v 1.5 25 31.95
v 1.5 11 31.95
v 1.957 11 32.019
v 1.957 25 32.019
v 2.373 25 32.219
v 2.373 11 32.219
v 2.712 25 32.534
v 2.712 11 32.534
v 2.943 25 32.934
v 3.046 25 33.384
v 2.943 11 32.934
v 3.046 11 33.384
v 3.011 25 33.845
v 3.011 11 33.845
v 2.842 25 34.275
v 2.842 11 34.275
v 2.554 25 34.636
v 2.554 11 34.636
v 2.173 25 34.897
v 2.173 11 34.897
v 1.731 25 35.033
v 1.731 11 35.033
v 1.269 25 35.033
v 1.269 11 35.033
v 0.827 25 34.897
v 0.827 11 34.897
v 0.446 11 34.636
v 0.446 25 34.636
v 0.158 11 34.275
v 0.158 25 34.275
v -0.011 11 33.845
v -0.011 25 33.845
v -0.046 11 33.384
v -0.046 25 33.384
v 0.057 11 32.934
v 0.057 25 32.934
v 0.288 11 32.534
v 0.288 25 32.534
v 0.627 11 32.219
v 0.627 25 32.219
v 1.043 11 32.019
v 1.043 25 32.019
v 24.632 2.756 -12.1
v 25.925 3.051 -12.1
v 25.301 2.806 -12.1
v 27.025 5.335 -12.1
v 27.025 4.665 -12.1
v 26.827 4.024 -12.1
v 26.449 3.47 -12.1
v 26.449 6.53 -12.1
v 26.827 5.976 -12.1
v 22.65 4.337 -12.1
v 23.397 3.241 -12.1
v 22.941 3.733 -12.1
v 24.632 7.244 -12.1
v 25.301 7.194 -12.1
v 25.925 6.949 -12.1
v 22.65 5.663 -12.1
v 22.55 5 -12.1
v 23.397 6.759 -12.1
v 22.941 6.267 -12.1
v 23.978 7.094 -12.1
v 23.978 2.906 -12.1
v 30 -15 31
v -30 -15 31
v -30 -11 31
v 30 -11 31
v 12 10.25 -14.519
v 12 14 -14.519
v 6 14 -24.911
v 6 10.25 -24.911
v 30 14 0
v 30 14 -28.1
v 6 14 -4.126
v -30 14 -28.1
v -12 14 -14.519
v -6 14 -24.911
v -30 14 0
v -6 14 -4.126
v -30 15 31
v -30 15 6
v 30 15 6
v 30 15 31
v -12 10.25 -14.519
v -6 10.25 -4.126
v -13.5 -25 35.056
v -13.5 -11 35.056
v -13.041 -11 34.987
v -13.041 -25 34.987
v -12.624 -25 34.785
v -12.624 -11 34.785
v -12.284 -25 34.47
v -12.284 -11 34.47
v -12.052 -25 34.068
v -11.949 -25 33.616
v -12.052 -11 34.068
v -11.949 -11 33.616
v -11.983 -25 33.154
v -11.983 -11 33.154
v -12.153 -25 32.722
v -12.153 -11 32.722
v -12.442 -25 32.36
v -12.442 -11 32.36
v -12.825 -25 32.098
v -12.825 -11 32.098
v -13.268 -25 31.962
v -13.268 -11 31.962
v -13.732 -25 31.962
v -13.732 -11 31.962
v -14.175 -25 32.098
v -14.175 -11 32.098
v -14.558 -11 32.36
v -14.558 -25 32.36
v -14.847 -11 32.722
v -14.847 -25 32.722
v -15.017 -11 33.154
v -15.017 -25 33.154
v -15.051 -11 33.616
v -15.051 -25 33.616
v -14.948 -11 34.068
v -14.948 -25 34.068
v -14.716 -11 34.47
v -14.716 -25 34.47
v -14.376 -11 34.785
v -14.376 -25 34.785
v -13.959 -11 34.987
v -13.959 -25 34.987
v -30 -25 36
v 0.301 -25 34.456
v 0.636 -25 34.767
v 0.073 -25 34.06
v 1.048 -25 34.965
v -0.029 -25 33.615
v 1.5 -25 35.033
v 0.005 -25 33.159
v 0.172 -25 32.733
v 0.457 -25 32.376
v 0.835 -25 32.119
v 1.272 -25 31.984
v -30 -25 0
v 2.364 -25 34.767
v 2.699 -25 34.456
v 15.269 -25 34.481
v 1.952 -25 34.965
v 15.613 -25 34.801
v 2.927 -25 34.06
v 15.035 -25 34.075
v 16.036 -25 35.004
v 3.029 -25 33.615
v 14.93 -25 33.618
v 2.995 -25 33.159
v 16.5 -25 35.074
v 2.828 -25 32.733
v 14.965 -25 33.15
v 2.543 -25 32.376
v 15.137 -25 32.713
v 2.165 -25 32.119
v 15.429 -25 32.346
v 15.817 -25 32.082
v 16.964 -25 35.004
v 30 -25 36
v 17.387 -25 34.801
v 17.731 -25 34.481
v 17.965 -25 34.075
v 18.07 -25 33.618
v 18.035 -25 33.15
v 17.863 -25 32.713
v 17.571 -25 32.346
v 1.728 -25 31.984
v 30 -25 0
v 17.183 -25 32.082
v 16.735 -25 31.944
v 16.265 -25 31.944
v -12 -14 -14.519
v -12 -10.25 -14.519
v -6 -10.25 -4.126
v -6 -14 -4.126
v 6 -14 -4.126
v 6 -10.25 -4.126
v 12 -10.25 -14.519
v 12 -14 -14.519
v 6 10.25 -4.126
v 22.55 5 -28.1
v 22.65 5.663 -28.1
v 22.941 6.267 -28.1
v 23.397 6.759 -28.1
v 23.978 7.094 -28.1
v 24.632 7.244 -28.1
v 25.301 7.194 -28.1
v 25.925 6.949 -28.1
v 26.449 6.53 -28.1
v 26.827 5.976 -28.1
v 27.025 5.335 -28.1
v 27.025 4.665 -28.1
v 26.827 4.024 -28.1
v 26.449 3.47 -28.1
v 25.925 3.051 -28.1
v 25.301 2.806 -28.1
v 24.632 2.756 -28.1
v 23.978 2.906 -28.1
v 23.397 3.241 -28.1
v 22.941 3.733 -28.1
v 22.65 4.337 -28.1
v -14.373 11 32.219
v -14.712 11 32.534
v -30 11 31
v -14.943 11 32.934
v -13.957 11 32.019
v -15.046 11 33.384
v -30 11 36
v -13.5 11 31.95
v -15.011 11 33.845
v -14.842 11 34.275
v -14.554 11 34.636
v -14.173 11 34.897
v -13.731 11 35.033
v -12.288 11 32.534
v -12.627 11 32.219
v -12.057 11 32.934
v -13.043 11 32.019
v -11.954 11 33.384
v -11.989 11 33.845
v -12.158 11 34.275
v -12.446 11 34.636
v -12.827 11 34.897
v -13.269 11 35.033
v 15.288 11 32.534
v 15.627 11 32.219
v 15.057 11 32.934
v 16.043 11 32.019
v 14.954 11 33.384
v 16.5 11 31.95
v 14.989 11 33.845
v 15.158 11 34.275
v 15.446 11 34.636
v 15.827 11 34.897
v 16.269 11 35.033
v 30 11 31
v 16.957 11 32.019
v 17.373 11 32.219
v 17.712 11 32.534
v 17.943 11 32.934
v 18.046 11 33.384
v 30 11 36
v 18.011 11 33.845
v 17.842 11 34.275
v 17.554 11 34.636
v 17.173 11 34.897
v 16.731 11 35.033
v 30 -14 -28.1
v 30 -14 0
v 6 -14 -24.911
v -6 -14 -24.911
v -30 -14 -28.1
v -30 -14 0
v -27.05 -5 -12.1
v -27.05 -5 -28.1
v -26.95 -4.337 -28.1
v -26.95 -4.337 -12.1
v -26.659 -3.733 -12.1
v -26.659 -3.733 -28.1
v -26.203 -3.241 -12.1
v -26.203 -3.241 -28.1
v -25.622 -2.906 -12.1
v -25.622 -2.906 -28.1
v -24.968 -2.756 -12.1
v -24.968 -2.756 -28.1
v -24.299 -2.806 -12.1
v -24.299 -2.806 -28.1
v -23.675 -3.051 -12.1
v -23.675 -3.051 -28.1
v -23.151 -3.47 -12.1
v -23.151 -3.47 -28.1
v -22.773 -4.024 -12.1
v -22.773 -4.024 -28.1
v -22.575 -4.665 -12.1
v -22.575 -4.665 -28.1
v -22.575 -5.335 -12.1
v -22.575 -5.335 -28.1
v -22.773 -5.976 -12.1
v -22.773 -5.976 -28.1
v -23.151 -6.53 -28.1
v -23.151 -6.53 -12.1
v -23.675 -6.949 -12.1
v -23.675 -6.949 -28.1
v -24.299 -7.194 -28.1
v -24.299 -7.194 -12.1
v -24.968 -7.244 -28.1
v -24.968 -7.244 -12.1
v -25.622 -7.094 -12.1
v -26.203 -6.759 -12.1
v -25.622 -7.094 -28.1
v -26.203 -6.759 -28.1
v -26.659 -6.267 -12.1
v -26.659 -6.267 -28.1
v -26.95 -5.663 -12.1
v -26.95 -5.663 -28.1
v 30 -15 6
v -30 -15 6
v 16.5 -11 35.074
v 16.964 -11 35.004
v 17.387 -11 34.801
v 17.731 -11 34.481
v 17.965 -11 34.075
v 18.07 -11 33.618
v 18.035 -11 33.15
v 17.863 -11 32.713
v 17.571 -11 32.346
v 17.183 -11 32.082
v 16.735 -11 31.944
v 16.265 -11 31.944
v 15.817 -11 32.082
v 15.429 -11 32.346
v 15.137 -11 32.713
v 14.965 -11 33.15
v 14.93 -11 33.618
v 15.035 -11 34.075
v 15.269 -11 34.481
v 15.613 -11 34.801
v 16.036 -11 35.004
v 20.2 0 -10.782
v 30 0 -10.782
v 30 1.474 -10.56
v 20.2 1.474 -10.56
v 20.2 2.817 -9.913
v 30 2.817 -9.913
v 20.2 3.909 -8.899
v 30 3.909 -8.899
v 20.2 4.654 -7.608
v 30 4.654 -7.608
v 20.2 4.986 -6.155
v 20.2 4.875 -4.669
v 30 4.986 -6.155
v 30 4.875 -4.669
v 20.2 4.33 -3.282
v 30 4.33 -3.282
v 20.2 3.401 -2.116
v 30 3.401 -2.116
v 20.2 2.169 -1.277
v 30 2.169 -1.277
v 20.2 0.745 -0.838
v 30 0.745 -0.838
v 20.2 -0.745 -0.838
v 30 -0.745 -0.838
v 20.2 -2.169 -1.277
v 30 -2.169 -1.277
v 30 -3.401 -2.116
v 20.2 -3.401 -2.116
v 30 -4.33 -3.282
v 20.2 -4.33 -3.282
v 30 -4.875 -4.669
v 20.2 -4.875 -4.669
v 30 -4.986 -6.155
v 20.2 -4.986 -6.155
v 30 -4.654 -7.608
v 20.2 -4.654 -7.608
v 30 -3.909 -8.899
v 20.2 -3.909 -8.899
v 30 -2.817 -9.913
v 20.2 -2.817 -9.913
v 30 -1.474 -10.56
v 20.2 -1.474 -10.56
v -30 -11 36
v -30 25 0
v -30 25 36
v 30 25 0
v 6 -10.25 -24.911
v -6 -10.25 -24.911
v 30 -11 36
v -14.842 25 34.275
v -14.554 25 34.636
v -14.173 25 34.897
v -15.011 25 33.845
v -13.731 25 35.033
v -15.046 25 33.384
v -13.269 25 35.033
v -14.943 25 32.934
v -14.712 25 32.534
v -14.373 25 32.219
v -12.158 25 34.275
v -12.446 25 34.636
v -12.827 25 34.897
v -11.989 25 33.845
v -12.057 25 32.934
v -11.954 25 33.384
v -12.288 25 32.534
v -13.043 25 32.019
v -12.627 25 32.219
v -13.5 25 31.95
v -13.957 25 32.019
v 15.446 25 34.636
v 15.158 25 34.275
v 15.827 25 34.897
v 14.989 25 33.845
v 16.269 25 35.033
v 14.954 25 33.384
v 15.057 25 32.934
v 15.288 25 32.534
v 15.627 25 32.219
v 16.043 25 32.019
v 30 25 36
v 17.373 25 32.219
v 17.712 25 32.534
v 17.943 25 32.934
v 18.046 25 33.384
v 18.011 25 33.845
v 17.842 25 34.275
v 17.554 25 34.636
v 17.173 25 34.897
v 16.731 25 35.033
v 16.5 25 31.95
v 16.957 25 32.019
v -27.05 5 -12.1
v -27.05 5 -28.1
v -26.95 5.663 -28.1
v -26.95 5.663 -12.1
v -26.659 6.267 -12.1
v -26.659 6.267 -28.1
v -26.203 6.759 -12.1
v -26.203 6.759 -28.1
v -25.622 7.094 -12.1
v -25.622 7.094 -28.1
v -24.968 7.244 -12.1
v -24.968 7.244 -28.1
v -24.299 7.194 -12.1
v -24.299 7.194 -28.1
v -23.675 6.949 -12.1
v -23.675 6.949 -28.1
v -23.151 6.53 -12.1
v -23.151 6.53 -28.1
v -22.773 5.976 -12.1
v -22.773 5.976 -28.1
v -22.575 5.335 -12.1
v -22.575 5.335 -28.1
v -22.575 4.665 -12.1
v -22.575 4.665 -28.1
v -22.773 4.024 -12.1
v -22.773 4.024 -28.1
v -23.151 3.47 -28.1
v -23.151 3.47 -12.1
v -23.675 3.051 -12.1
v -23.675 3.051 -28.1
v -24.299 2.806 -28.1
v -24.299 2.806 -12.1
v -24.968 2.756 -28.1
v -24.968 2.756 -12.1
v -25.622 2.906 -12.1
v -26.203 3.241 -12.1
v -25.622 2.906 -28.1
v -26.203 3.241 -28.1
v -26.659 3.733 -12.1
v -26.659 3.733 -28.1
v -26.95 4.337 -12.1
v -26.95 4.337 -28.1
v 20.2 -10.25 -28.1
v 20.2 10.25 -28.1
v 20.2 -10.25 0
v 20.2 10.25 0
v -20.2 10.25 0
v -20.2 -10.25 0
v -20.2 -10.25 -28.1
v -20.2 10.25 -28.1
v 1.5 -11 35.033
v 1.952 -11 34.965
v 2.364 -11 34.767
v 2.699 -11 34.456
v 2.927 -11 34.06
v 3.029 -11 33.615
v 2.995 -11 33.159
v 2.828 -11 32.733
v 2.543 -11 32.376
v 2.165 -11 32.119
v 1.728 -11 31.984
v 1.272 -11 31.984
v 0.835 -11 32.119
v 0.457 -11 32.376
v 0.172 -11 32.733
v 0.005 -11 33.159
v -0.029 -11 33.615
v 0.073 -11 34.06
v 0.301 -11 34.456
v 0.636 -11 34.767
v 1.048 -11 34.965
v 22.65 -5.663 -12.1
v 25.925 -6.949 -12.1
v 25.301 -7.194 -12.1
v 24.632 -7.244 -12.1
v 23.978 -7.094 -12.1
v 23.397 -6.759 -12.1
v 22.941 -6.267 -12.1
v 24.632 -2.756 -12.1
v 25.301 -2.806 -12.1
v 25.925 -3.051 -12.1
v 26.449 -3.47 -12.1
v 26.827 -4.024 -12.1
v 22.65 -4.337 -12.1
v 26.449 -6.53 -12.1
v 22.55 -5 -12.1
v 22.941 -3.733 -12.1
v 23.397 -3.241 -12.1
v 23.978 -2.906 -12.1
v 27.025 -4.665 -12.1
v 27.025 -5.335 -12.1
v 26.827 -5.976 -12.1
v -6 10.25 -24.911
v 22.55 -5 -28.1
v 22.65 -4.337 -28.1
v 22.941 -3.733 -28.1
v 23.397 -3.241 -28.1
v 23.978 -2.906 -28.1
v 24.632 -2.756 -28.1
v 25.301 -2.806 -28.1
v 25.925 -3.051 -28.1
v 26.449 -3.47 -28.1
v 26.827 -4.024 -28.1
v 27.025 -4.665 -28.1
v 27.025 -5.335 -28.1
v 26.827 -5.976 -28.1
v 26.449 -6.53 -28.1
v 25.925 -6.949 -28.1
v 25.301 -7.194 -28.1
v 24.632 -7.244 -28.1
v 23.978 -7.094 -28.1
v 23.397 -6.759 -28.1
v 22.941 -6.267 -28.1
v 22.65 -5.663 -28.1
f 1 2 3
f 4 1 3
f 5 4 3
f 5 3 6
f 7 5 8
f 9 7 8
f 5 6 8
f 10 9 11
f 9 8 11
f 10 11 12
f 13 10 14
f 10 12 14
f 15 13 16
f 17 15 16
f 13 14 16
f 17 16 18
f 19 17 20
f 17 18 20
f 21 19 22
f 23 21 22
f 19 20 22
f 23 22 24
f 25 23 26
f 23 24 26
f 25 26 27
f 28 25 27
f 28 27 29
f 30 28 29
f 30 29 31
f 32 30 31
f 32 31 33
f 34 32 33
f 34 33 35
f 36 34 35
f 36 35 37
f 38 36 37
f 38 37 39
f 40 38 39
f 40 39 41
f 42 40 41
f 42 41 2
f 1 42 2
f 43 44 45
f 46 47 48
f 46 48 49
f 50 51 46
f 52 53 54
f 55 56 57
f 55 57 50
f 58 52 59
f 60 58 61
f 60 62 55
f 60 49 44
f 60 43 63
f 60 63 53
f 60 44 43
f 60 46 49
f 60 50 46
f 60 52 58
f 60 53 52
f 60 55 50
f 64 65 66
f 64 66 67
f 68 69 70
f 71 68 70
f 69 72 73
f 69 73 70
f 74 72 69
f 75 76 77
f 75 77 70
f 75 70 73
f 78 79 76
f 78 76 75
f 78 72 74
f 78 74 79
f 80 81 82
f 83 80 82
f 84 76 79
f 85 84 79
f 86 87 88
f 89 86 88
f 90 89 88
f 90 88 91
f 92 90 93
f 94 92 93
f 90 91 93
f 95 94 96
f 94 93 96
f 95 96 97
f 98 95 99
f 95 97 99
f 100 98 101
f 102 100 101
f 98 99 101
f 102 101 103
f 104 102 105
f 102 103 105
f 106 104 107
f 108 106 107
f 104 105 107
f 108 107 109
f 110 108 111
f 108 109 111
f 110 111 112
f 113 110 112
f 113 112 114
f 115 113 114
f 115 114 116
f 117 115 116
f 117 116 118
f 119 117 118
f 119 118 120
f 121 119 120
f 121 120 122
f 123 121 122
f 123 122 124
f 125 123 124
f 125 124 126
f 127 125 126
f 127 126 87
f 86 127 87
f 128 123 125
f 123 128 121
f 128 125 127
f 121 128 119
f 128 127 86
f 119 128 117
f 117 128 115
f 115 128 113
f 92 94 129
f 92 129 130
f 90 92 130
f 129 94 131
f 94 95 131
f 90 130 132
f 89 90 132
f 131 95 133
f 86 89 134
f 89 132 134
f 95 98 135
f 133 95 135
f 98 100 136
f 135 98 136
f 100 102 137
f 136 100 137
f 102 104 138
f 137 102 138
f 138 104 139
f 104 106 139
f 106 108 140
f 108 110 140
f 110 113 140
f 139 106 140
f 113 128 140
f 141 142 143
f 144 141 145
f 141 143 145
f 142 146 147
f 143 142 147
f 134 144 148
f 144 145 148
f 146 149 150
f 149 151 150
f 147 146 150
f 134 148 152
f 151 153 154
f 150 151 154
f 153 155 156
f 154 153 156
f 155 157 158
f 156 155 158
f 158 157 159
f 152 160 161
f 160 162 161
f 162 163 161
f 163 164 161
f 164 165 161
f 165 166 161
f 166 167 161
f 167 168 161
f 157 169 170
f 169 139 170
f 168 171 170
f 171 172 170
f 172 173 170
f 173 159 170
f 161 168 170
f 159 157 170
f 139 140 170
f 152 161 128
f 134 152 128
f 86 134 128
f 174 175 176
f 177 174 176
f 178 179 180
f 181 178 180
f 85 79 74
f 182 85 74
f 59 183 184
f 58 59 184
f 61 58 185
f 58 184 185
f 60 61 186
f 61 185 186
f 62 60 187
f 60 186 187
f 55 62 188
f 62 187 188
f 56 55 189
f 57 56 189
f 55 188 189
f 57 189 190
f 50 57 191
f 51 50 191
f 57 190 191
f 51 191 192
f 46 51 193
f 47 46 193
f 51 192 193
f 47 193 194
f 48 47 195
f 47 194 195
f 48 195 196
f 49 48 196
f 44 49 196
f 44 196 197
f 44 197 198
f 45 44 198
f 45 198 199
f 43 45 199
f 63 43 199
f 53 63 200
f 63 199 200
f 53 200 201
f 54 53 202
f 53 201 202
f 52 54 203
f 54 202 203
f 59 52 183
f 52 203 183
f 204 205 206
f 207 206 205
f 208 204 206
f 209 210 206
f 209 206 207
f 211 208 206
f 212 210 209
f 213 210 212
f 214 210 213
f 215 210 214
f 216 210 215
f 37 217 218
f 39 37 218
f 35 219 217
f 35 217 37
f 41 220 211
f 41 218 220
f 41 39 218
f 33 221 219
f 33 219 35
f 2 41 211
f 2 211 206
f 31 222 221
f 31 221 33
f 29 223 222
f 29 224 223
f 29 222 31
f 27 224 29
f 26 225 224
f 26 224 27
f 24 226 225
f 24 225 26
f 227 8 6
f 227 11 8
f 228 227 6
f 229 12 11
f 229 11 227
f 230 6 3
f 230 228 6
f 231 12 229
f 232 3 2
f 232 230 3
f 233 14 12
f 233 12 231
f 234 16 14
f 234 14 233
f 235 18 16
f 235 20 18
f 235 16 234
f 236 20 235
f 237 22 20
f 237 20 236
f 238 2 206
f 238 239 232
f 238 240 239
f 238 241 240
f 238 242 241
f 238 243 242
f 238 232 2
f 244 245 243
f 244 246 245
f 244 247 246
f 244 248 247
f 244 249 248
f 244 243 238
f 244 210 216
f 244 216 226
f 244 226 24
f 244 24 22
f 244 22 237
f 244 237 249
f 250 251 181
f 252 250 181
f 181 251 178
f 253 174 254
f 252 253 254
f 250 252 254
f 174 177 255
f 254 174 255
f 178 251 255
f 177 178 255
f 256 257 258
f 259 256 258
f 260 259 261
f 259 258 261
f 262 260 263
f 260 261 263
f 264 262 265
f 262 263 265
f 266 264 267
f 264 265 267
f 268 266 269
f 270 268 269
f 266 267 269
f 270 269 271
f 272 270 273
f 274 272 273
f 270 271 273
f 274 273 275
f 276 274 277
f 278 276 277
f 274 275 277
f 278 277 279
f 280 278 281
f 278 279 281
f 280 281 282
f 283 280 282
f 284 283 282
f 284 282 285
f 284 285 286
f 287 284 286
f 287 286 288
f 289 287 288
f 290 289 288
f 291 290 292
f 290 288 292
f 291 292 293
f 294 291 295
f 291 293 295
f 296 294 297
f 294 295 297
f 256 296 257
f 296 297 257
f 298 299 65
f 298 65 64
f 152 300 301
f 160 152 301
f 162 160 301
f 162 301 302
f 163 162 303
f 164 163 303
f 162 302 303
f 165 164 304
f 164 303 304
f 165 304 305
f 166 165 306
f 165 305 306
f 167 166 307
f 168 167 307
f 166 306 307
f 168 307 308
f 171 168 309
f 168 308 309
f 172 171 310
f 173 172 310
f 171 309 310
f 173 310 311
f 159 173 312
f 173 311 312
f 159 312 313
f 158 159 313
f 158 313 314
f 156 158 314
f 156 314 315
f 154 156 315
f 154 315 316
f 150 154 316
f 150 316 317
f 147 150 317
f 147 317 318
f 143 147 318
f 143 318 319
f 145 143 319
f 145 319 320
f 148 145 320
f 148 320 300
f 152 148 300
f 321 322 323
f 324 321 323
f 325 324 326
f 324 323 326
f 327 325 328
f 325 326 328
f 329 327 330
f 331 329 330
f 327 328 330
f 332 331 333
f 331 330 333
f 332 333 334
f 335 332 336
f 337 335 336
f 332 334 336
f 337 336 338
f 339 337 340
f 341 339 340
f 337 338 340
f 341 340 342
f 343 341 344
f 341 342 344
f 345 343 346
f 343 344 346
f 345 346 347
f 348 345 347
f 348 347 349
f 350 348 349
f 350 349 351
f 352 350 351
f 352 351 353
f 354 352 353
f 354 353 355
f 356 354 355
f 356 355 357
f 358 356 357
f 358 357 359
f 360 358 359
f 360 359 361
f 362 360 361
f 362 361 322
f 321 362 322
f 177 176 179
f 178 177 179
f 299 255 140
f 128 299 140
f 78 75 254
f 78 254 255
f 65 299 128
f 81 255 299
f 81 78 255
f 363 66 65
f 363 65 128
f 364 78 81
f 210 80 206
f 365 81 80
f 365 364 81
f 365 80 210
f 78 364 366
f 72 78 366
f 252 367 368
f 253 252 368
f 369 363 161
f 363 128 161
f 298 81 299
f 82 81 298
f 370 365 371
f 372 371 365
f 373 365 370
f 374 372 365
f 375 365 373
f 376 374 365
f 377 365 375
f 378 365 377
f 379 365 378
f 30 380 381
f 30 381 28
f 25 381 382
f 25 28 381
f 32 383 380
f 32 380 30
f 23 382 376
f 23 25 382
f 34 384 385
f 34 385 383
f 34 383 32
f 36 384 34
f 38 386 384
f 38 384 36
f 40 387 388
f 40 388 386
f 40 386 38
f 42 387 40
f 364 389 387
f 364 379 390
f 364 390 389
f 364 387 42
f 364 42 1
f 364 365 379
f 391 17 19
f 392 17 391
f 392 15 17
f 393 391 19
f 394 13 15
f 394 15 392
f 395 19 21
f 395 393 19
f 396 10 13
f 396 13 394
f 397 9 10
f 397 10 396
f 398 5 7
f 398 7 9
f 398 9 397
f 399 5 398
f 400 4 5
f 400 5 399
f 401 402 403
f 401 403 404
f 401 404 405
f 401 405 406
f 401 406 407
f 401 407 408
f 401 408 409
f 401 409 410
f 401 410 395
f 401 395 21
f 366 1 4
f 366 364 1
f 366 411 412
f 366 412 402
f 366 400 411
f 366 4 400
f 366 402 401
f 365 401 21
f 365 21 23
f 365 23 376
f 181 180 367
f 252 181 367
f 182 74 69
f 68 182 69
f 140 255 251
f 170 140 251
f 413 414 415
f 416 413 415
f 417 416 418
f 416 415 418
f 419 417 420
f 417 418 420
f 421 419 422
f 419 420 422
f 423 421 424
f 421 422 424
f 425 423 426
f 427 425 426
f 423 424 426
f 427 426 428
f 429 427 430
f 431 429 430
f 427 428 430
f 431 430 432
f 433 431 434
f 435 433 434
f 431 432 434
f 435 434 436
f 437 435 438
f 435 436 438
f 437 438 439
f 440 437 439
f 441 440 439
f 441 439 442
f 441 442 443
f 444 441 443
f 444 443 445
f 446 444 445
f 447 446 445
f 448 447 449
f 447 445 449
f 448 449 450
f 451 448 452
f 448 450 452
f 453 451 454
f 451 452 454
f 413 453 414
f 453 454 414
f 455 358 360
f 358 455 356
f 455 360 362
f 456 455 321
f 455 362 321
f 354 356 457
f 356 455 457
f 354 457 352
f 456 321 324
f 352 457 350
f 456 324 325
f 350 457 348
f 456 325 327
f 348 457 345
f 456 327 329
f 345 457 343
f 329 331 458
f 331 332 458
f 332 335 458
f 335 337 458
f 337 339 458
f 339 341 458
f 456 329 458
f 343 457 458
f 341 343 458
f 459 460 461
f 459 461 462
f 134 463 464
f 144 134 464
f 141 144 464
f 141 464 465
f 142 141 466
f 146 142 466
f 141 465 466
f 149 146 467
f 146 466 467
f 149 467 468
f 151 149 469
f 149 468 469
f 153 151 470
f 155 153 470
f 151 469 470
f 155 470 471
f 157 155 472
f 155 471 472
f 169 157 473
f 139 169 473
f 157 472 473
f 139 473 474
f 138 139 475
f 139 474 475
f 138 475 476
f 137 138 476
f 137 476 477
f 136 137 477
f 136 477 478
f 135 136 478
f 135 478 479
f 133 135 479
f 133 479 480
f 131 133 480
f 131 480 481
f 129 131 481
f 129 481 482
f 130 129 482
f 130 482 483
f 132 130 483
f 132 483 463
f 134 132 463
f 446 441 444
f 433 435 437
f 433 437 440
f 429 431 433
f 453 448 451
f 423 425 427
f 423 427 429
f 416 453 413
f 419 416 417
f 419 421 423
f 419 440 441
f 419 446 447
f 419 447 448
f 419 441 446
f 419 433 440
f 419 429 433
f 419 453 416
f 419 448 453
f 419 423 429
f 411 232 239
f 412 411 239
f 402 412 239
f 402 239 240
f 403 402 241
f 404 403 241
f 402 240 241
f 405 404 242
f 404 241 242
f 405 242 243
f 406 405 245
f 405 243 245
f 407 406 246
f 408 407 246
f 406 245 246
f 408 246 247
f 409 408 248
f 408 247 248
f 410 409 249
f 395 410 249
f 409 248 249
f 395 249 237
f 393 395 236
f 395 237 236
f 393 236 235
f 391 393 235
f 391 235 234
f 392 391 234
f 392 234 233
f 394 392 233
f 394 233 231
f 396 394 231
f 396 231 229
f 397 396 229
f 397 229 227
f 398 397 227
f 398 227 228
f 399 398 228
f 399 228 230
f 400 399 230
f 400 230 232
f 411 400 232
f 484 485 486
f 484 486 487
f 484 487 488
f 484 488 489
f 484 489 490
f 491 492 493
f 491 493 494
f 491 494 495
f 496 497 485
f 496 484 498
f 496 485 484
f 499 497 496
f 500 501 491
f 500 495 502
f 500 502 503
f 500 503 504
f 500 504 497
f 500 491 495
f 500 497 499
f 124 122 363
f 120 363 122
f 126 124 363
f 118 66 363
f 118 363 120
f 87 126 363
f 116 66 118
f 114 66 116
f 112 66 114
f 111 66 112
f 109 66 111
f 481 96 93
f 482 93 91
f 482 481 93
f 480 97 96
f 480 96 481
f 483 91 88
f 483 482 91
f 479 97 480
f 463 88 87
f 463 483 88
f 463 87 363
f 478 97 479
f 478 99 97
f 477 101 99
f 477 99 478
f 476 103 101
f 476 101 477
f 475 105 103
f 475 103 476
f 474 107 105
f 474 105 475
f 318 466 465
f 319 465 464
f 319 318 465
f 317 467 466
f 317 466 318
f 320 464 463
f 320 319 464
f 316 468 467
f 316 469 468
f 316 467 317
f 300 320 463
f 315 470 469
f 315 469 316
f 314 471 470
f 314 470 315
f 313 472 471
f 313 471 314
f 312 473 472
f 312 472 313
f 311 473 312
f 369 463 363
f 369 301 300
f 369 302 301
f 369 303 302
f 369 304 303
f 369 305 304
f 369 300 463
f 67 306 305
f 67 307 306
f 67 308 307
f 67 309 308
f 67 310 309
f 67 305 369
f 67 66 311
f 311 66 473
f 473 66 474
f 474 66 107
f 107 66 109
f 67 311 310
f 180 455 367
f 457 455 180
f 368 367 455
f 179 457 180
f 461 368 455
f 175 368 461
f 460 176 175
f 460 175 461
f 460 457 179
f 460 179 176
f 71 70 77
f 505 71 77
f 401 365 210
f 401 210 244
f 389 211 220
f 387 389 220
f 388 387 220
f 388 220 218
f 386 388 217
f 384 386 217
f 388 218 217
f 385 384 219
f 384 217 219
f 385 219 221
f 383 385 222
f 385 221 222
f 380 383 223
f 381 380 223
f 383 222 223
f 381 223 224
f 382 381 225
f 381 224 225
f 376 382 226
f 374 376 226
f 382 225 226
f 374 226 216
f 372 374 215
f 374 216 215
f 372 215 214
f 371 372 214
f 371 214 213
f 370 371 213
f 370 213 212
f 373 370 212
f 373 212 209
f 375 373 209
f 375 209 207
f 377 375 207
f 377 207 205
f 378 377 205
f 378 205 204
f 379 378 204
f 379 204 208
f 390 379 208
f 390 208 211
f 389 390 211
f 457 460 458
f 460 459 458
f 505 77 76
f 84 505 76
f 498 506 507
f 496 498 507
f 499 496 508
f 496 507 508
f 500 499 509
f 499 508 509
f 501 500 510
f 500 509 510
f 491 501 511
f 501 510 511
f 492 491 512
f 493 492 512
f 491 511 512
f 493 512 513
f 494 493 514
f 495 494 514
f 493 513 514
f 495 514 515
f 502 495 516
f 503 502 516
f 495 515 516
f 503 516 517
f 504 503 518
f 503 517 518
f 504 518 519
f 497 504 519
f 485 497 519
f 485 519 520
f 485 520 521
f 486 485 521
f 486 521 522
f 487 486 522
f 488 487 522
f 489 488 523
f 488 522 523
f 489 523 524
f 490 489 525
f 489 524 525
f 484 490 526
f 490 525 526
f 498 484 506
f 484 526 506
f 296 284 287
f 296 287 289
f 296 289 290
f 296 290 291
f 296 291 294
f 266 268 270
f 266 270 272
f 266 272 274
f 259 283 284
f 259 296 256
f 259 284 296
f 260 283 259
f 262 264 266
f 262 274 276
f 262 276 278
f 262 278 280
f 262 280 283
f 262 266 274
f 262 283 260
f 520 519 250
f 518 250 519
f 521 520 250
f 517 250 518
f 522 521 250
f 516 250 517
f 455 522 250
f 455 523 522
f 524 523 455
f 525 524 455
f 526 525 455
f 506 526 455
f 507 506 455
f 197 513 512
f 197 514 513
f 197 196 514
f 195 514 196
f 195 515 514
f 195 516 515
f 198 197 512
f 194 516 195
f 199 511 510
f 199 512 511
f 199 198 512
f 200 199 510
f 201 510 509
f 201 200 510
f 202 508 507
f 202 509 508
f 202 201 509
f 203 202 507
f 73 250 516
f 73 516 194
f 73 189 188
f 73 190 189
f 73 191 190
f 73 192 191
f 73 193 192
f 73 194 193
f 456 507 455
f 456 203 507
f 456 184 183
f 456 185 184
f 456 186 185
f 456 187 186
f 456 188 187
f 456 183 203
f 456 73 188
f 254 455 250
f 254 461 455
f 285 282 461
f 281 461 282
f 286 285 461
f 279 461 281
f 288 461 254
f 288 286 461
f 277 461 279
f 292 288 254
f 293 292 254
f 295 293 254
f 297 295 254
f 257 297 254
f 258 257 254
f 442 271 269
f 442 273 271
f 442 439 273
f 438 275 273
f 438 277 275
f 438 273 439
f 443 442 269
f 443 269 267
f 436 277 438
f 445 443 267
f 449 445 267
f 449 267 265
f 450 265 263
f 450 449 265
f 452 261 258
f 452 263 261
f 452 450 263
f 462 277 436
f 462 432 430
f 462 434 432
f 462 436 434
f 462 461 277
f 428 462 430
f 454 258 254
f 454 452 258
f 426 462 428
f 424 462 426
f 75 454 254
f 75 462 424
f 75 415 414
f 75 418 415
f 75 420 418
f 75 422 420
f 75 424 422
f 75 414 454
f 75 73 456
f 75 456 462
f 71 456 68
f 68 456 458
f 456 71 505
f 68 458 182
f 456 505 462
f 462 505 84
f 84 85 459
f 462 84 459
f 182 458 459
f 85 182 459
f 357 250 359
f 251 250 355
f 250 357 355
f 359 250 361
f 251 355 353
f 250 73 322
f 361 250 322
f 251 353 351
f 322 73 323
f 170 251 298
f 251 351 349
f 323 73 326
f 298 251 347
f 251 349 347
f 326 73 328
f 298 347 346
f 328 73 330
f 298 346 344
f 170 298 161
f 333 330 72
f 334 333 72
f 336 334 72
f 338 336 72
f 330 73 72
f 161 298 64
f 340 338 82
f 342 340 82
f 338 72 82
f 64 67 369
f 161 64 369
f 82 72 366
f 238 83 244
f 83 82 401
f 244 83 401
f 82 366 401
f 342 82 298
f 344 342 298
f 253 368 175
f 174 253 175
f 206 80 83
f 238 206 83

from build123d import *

# Parameters (mm, degrees)
SKETCH_1_W          = 60
SKETCH_1_H          = 50
EXTRUDE_1_DEPTH     = 6
SKETCH_2_W          = 60
SKETCH_2_H          = 10
EXTRUDE_3_DEPTH     = 30
SKETCH_3_W          = 60
SKETCH_3_H          = 5
EXTRUDE_4_DEPTH     = 4
SKETCH_4_W          = 60
SKETCH_4_H          = 5
EXTRUDE_5_DEPTH     = 4
SKETCH_6_R          = 1.555741847
SKETCH_6_R_2        = 1.533074906
SKETCH_6_R_3        = 1.574012297
CUT_EXTRUDE_1_DEPTH = 60.093146811
SKETCH_7_R          = 1.55
CUT_EXTRUDE_2_DEPTH = 60.093146811
SKETCH_9_W          = 60
SKETCH_9_H          = 28
SKETCH_9_W_2        = 40.4
SKETCH_9_H_2        = 20.5
EXTRUDE_6_DEPTH     = 28.1
SKETCH_11_R         = 5
CUT_EXTRUDE_3_DEPTH = 10
SKETCH_12_R         = 2.25
CUT_EXTRUDE_4_DEPTH = 16
CUT_EXTRUDE_5_DEPTH = 61.967204299


with BuildPart() as part:
    # 草图1 → 凸台-拉伸1 (new body)
    with BuildSketch(Plane.XY):
        Rectangle(SKETCH_1_W, SKETCH_1_H)
    extrude(amount=EXTRUDE_1_DEPTH)

    # 草图2 → 凸台-拉伸3 (add)
    with BuildSketch(Plane.XY.offset(6)):
        with Locations((0, 20)):
            Rectangle(SKETCH_2_W, SKETCH_2_H)
        with Locations((0, -20)):
            Rectangle(SKETCH_2_W, SKETCH_2_H)
    extrude(amount=EXTRUDE_3_DEPTH)

    # 草图3 → 凸台-拉伸4 (add)
    with BuildSketch(Plane(origin=(0, -15, 0), x_dir=(1, 0, 0), z_dir=(0, 1, 0))):
        with Locations((0, -33.5)):
            Rectangle(SKETCH_3_W, SKETCH_3_H)
    extrude(amount=EXTRUDE_4_DEPTH)

    # 草图4 → 凸台-拉伸5 (add)
    with BuildSketch(Plane.XZ.offset(-15)):
        with Locations((0, 33.5)):
            Rectangle(SKETCH_4_W, SKETCH_4_H)
    extrude(amount=EXTRUDE_5_DEPTH)

    # 草图6 → 切除-拉伸1 (cut, through all)
    with BuildSketch(Plane(origin=(0, -11, 0), x_dir=(1, 0, 0), z_dir=(0, 1, 0))):
        with Locations(Location((-13.5, -33.5, 0), (0, 0, 270))):
            Circle(SKETCH_6_R)
        with Locations(Location((1.5, -33.5, 0), (0, 0, 270))):
            Circle(SKETCH_6_R_2)
        with Locations(Location((16.5, -33.5, 0), (0, 0, 270))):
            Circle(SKETCH_6_R_3)
    extrude(amount=-CUT_EXTRUDE_1_DEPTH, mode=Mode.SUBTRACT)

    # 草图7 → 切除-拉伸2 (cut, through all)
    with BuildSketch(Plane.XZ.offset(-11)):
        with Locations(Location((16.5, 33.5, 0), (0, 0, 270))):
            Circle(SKETCH_7_R)
        with Locations(Location((1.5, 33.5, 0), (0, 0, 270))):
            Circle(SKETCH_7_R)
        with Locations(Location((-13.5, 33.5, 0), (0, 0, 270))):
            Circle(SKETCH_7_R)
    extrude(amount=-CUT_EXTRUDE_2_DEPTH, mode=Mode.SUBTRACT)

    # 草图9 → 凸台-拉伸6 (add)
    with BuildSketch(Plane(origin=(0, 0, 0), x_dir=(-1, 0, 0), z_dir=(0, 0, -1))):
        Rectangle(SKETCH_9_W, SKETCH_9_H)
        Rectangle(SKETCH_9_W_2, SKETCH_9_H_2, mode=Mode.SUBTRACT)
    extrude(amount=EXTRUDE_6_DEPTH)

    # 草图11 → 切除-拉伸3 (cut)
    with BuildSketch(Plane(origin=(30, 0, 0), x_dir=(0, 0, -1), z_dir=(1, 0, 0))):
        with Locations((5.781700187, 0)):
            Circle(SKETCH_11_R)
    extrude(amount=-CUT_EXTRUDE_3_DEPTH, mode=Mode.SUBTRACT)

    # 草图12 → 切除-拉伸4 (cut)
    with BuildSketch(Plane(origin=(0, 0, -28.1), x_dir=(-1, 0, 0), z_dir=(0, 0, -1))):
        with Locations((24.8, -5)):
            Circle(SKETCH_12_R)
        with Locations((24.8, 5)):
            Circle(SKETCH_12_R)
        with Locations((-24.8, -5)):
            Circle(SKETCH_12_R)
        with Locations((-24.8, 5)):
            Circle(SKETCH_12_R)
    extrude(amount=-CUT_EXTRUDE_4_DEPTH, mode=Mode.SUBTRACT)

    # 草图13 → 切除-拉伸5 (cut, through all)
    with BuildSketch(Plane(origin=(0, 14, 0), x_dir=(1, 0, 0), z_dir=(0, 1, 0))):
        Polygon((-12, 14.518770095), (-6, 4.12646525), (6, 4.12646525), (12, 14.518770095), (6, 24.911074941), (-6, 24.911074941), align=None)
    extrude(amount=-CUT_EXTRUDE_5_DEPTH, mode=Mode.SUBTRACT)


solid = part.part
